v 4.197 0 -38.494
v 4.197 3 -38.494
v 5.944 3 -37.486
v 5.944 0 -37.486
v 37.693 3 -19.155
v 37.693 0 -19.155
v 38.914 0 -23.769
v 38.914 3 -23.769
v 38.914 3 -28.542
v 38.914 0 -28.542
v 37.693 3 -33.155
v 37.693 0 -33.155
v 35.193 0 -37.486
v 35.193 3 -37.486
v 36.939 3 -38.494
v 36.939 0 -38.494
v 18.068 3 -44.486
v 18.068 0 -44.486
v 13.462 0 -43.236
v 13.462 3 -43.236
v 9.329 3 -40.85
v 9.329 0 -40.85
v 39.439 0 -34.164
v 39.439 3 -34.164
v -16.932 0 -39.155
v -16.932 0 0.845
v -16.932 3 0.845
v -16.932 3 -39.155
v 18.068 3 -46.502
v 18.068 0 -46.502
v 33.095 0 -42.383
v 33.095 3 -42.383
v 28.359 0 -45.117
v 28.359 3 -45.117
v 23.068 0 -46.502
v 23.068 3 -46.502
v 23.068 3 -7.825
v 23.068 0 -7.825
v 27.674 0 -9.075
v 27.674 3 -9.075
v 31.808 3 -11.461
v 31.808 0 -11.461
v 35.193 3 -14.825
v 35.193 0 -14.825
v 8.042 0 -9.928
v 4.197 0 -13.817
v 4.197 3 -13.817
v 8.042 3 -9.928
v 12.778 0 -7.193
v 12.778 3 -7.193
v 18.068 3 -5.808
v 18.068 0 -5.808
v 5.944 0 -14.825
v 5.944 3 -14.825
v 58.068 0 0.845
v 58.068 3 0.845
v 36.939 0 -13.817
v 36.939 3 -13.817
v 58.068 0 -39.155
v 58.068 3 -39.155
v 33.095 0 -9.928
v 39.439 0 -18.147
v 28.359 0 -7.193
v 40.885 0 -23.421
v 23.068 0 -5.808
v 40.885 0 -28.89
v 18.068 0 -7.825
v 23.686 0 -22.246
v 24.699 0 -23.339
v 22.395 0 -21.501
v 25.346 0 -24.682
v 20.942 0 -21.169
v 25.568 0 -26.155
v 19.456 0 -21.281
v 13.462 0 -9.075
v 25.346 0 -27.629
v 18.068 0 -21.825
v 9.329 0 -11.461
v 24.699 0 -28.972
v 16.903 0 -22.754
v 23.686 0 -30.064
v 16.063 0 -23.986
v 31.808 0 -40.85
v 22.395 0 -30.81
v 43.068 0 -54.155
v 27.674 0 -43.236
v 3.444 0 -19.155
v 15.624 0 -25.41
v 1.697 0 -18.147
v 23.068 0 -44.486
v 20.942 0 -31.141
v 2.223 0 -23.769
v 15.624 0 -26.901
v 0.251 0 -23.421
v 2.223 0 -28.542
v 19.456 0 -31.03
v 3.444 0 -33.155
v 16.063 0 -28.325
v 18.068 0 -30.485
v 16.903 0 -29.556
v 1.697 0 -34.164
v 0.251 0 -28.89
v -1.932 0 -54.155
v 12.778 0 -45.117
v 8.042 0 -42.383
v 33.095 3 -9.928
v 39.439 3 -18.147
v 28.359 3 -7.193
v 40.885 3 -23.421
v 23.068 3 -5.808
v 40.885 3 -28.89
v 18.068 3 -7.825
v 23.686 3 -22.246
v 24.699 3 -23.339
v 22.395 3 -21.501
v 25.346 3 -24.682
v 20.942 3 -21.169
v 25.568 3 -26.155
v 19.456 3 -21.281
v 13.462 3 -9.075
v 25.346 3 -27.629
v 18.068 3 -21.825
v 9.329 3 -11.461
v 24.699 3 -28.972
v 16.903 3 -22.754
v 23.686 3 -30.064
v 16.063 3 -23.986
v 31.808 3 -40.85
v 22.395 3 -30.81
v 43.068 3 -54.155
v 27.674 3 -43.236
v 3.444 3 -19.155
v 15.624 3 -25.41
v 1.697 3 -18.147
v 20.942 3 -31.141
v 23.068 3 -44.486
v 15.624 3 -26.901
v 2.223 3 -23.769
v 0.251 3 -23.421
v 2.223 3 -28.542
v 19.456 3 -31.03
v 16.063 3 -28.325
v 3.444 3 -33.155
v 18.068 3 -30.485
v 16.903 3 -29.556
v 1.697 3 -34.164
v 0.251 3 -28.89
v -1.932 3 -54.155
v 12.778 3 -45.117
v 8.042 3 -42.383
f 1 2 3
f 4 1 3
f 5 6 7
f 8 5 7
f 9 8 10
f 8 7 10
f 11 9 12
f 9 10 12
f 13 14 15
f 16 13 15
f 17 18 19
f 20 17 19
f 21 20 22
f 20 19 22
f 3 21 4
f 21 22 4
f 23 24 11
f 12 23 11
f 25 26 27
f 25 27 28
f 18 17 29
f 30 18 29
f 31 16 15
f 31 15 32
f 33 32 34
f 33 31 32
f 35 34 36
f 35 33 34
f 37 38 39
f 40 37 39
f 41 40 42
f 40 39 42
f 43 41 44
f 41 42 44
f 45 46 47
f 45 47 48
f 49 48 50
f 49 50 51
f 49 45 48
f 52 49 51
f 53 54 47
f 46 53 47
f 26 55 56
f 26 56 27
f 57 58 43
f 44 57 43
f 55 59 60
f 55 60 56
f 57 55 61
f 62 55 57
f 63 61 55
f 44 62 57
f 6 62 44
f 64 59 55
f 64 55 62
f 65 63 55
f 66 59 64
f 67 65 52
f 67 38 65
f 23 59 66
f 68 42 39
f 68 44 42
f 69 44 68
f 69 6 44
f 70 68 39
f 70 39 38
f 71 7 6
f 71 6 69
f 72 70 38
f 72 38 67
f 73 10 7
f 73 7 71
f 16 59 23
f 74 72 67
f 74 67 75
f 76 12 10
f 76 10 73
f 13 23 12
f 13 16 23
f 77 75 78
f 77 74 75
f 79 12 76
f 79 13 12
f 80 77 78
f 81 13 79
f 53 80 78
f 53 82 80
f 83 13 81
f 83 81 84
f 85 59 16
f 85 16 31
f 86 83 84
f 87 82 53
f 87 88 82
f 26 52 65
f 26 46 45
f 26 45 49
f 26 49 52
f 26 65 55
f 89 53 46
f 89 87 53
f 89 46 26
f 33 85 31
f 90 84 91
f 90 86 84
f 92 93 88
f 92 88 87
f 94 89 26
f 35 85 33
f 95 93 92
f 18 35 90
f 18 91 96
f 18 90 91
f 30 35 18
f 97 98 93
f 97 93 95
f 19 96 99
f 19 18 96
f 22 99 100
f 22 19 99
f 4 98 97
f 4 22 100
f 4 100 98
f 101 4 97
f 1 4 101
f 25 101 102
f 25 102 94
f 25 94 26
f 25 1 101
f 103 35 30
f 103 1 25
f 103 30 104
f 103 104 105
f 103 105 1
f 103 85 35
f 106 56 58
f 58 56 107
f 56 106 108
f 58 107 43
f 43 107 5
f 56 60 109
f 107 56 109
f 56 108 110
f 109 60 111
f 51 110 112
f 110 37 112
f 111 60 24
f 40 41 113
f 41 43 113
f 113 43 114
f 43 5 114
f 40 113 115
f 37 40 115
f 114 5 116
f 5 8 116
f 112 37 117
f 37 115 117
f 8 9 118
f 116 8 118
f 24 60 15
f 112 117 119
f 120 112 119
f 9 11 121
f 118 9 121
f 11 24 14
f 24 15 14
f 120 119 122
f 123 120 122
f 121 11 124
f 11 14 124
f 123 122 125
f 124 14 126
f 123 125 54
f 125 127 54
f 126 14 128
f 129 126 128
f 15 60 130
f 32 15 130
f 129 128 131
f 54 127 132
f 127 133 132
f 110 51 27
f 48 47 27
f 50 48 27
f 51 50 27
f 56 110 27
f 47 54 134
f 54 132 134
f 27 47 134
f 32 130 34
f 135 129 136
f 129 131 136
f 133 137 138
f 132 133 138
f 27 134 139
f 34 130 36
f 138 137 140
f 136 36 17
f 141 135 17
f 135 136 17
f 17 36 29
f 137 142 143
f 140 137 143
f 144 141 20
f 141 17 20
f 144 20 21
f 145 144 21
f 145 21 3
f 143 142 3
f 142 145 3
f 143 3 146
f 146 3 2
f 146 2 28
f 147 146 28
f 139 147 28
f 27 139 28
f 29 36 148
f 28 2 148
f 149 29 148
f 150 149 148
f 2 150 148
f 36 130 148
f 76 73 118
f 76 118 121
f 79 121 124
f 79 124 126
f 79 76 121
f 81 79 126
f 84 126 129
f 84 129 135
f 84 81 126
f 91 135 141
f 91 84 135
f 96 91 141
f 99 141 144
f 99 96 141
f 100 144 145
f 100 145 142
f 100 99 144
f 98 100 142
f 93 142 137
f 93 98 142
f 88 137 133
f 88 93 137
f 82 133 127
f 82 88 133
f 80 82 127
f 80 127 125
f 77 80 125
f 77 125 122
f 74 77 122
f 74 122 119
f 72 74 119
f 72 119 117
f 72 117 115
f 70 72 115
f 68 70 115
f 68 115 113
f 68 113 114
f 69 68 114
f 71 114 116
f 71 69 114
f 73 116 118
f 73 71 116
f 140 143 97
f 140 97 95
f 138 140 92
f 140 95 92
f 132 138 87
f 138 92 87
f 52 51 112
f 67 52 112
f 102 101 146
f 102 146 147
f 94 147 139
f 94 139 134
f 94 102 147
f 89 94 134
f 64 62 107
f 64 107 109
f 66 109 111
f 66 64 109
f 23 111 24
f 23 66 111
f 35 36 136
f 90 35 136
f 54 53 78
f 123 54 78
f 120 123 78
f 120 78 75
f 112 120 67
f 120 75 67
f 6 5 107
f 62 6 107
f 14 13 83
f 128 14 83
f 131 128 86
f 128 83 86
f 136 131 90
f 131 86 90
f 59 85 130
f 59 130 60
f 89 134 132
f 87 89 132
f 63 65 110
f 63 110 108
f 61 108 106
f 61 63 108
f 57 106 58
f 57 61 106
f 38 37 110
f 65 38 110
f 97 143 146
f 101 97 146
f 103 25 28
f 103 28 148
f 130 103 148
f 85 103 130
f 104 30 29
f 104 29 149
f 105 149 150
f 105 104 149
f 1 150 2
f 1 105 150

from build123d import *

# Parameters (mm, degrees)
SKETCH1_R             = 18.5
SKETCH1_R_2           = 5
BOSS_EXTRUDE1_DEPTH   = 3
SKETCH1_R_3           = 20.5
BOSS_EXTRUDE1_2_DEPTH = 3
BOSS_EXTRUDE2_DEPTH   = 3


with BuildPart() as part:
    # Sketch1 → Boss-Extrude1 (new body)
    with BuildSketch(Plane(origin=(0, 0, 0), x_dir=(1, 0, 0), z_dir=(0, 1, 0))):
        with Locations((20.568259386, 26.155290102)):
            Circle(SKETCH1_R)
        with Locations((20.568259386, 26.155290102)):
            Circle(SKETCH1_R_2, mode=Mode.SUBTRACT)
    extrude(amount=BOSS_EXTRUDE1_DEPTH)



with BuildPart() as body_2:
    # Sketch1 → Boss-Extrude1 2 (new body)
    with BuildSketch(Plane(origin=(0, 0, 0), x_dir=(1, 0, 0), z_dir=(0, 1, 0))):
        Polygon((-16.931740614, 39.155290102), (-1.931740614, 54.155290102), (43.068259386, 54.155290102), (58.068259386, 39.155290102), (58.068259386, -0.844709898), (-16.931740614, -0.844709898), align=None)
        with Locations((20.568259386, 26.155290102)):
            Circle(SKETCH1_R_3, mode=Mode.SUBTRACT)
    extrude(amount=BOSS_EXTRUDE1_2_DEPTH)


with BuildPart() as part_1:
    add(part.part)

    add(body_2.part)  # Boss-Extrude2 merges body 2
    # Sketch2 → Boss-Extrude2 (add, through all)
    with BuildSketch(Plane(origin=(0, 3, 0), x_dir=(1, 0, 0), z_dir=(0, 1, 0))):
        with BuildLine():
            Line((18.068259386, 44.485592882), (18.068259386, 46.502280052))
            ThreePointArc((18.068259386, 46.502280052), (20.568259386, 46.655290102), (23.068259386, 46.502280052))
            Line((23.068259386, 46.502280052), (23.068259386, 44.485592882))
            ThreePointArc((23.068259386, 44.485592882), (20.568259386, 44.655290102), (18.068259386, 44.485592882))
        make_face()
        with BuildLine():
            Line((35.192767252, 37.485505002), (36.939269572, 38.493848587))
            ThreePointArc((36.939269572, 38.493848587), (38.321780163, 36.405290102), (39.439269572, 34.163721568))
            Line((39.439269572, 34.163721568), (37.692767252, 33.155377983))
            ThreePointArc((37.692767252, 33.155377983), (36.589729356, 35.405290102), (35.192767252, 37.485505002))
        make_face()
        with BuildLine():
            Line((37.692767252, 19.155202222), (39.439269572, 18.146858637))
            ThreePointArc((39.439269572, 18.146858637), (38.321780163, 15.905290102), (36.939269572, 13.816731618))
            Line((36.939269572, 13.816731618), (35.192767252, 14.825075203))
            ThreePointArc((35.192767252, 14.825075203), (36.589729356, 16.905290102), (37.692767252, 19.155202222))
        make_face()
        with BuildLine():
            Line((23.068259386, 7.824987323), (23.068259386, 5.808300153))
            ThreePointArc((23.068259386, 5.808300153), (20.568259386, 5.655290102), (18.068259386, 5.808300153))
            Line((18.068259386, 5.808300153), (18.068259386, 7.824987323))
            ThreePointArc((18.068259386, 7.824987323), (20.568259386, 7.655290102), (23.068259386, 7.824987323))
        make_face()
        with BuildLine():
            Line((5.943751519, 14.825075203), (4.197249199, 13.816731618))
            ThreePointArc((4.197249199, 13.816731618), (2.814738608, 15.905290102), (1.697249199, 18.146858637))
            Line((1.697249199, 18.146858637), (3.443751519, 19.155202222))
            ThreePointArc((3.443751519, 19.155202222), (4.546789416, 16.905290102), (5.943751519, 14.825075203))
        make_face()
        with BuildLine():
            Line((3.443751519, 33.155377983), (1.697249199, 34.163721568))
            ThreePointArc((1.697249199, 34.163721568), (2.814738608, 36.405290102), (4.197249199, 38.493848587))
            Line((4.197249199, 38.493848587), (5.943751519, 37.485505002))
            ThreePointArc((5.943751519, 37.485505002), (4.546789416, 35.405290102), (3.443751519, 33.155377983))
        make_face()
    extrude(amount=-BOSS_EXTRUDE2_DEPTH)


solid = part_1.part
